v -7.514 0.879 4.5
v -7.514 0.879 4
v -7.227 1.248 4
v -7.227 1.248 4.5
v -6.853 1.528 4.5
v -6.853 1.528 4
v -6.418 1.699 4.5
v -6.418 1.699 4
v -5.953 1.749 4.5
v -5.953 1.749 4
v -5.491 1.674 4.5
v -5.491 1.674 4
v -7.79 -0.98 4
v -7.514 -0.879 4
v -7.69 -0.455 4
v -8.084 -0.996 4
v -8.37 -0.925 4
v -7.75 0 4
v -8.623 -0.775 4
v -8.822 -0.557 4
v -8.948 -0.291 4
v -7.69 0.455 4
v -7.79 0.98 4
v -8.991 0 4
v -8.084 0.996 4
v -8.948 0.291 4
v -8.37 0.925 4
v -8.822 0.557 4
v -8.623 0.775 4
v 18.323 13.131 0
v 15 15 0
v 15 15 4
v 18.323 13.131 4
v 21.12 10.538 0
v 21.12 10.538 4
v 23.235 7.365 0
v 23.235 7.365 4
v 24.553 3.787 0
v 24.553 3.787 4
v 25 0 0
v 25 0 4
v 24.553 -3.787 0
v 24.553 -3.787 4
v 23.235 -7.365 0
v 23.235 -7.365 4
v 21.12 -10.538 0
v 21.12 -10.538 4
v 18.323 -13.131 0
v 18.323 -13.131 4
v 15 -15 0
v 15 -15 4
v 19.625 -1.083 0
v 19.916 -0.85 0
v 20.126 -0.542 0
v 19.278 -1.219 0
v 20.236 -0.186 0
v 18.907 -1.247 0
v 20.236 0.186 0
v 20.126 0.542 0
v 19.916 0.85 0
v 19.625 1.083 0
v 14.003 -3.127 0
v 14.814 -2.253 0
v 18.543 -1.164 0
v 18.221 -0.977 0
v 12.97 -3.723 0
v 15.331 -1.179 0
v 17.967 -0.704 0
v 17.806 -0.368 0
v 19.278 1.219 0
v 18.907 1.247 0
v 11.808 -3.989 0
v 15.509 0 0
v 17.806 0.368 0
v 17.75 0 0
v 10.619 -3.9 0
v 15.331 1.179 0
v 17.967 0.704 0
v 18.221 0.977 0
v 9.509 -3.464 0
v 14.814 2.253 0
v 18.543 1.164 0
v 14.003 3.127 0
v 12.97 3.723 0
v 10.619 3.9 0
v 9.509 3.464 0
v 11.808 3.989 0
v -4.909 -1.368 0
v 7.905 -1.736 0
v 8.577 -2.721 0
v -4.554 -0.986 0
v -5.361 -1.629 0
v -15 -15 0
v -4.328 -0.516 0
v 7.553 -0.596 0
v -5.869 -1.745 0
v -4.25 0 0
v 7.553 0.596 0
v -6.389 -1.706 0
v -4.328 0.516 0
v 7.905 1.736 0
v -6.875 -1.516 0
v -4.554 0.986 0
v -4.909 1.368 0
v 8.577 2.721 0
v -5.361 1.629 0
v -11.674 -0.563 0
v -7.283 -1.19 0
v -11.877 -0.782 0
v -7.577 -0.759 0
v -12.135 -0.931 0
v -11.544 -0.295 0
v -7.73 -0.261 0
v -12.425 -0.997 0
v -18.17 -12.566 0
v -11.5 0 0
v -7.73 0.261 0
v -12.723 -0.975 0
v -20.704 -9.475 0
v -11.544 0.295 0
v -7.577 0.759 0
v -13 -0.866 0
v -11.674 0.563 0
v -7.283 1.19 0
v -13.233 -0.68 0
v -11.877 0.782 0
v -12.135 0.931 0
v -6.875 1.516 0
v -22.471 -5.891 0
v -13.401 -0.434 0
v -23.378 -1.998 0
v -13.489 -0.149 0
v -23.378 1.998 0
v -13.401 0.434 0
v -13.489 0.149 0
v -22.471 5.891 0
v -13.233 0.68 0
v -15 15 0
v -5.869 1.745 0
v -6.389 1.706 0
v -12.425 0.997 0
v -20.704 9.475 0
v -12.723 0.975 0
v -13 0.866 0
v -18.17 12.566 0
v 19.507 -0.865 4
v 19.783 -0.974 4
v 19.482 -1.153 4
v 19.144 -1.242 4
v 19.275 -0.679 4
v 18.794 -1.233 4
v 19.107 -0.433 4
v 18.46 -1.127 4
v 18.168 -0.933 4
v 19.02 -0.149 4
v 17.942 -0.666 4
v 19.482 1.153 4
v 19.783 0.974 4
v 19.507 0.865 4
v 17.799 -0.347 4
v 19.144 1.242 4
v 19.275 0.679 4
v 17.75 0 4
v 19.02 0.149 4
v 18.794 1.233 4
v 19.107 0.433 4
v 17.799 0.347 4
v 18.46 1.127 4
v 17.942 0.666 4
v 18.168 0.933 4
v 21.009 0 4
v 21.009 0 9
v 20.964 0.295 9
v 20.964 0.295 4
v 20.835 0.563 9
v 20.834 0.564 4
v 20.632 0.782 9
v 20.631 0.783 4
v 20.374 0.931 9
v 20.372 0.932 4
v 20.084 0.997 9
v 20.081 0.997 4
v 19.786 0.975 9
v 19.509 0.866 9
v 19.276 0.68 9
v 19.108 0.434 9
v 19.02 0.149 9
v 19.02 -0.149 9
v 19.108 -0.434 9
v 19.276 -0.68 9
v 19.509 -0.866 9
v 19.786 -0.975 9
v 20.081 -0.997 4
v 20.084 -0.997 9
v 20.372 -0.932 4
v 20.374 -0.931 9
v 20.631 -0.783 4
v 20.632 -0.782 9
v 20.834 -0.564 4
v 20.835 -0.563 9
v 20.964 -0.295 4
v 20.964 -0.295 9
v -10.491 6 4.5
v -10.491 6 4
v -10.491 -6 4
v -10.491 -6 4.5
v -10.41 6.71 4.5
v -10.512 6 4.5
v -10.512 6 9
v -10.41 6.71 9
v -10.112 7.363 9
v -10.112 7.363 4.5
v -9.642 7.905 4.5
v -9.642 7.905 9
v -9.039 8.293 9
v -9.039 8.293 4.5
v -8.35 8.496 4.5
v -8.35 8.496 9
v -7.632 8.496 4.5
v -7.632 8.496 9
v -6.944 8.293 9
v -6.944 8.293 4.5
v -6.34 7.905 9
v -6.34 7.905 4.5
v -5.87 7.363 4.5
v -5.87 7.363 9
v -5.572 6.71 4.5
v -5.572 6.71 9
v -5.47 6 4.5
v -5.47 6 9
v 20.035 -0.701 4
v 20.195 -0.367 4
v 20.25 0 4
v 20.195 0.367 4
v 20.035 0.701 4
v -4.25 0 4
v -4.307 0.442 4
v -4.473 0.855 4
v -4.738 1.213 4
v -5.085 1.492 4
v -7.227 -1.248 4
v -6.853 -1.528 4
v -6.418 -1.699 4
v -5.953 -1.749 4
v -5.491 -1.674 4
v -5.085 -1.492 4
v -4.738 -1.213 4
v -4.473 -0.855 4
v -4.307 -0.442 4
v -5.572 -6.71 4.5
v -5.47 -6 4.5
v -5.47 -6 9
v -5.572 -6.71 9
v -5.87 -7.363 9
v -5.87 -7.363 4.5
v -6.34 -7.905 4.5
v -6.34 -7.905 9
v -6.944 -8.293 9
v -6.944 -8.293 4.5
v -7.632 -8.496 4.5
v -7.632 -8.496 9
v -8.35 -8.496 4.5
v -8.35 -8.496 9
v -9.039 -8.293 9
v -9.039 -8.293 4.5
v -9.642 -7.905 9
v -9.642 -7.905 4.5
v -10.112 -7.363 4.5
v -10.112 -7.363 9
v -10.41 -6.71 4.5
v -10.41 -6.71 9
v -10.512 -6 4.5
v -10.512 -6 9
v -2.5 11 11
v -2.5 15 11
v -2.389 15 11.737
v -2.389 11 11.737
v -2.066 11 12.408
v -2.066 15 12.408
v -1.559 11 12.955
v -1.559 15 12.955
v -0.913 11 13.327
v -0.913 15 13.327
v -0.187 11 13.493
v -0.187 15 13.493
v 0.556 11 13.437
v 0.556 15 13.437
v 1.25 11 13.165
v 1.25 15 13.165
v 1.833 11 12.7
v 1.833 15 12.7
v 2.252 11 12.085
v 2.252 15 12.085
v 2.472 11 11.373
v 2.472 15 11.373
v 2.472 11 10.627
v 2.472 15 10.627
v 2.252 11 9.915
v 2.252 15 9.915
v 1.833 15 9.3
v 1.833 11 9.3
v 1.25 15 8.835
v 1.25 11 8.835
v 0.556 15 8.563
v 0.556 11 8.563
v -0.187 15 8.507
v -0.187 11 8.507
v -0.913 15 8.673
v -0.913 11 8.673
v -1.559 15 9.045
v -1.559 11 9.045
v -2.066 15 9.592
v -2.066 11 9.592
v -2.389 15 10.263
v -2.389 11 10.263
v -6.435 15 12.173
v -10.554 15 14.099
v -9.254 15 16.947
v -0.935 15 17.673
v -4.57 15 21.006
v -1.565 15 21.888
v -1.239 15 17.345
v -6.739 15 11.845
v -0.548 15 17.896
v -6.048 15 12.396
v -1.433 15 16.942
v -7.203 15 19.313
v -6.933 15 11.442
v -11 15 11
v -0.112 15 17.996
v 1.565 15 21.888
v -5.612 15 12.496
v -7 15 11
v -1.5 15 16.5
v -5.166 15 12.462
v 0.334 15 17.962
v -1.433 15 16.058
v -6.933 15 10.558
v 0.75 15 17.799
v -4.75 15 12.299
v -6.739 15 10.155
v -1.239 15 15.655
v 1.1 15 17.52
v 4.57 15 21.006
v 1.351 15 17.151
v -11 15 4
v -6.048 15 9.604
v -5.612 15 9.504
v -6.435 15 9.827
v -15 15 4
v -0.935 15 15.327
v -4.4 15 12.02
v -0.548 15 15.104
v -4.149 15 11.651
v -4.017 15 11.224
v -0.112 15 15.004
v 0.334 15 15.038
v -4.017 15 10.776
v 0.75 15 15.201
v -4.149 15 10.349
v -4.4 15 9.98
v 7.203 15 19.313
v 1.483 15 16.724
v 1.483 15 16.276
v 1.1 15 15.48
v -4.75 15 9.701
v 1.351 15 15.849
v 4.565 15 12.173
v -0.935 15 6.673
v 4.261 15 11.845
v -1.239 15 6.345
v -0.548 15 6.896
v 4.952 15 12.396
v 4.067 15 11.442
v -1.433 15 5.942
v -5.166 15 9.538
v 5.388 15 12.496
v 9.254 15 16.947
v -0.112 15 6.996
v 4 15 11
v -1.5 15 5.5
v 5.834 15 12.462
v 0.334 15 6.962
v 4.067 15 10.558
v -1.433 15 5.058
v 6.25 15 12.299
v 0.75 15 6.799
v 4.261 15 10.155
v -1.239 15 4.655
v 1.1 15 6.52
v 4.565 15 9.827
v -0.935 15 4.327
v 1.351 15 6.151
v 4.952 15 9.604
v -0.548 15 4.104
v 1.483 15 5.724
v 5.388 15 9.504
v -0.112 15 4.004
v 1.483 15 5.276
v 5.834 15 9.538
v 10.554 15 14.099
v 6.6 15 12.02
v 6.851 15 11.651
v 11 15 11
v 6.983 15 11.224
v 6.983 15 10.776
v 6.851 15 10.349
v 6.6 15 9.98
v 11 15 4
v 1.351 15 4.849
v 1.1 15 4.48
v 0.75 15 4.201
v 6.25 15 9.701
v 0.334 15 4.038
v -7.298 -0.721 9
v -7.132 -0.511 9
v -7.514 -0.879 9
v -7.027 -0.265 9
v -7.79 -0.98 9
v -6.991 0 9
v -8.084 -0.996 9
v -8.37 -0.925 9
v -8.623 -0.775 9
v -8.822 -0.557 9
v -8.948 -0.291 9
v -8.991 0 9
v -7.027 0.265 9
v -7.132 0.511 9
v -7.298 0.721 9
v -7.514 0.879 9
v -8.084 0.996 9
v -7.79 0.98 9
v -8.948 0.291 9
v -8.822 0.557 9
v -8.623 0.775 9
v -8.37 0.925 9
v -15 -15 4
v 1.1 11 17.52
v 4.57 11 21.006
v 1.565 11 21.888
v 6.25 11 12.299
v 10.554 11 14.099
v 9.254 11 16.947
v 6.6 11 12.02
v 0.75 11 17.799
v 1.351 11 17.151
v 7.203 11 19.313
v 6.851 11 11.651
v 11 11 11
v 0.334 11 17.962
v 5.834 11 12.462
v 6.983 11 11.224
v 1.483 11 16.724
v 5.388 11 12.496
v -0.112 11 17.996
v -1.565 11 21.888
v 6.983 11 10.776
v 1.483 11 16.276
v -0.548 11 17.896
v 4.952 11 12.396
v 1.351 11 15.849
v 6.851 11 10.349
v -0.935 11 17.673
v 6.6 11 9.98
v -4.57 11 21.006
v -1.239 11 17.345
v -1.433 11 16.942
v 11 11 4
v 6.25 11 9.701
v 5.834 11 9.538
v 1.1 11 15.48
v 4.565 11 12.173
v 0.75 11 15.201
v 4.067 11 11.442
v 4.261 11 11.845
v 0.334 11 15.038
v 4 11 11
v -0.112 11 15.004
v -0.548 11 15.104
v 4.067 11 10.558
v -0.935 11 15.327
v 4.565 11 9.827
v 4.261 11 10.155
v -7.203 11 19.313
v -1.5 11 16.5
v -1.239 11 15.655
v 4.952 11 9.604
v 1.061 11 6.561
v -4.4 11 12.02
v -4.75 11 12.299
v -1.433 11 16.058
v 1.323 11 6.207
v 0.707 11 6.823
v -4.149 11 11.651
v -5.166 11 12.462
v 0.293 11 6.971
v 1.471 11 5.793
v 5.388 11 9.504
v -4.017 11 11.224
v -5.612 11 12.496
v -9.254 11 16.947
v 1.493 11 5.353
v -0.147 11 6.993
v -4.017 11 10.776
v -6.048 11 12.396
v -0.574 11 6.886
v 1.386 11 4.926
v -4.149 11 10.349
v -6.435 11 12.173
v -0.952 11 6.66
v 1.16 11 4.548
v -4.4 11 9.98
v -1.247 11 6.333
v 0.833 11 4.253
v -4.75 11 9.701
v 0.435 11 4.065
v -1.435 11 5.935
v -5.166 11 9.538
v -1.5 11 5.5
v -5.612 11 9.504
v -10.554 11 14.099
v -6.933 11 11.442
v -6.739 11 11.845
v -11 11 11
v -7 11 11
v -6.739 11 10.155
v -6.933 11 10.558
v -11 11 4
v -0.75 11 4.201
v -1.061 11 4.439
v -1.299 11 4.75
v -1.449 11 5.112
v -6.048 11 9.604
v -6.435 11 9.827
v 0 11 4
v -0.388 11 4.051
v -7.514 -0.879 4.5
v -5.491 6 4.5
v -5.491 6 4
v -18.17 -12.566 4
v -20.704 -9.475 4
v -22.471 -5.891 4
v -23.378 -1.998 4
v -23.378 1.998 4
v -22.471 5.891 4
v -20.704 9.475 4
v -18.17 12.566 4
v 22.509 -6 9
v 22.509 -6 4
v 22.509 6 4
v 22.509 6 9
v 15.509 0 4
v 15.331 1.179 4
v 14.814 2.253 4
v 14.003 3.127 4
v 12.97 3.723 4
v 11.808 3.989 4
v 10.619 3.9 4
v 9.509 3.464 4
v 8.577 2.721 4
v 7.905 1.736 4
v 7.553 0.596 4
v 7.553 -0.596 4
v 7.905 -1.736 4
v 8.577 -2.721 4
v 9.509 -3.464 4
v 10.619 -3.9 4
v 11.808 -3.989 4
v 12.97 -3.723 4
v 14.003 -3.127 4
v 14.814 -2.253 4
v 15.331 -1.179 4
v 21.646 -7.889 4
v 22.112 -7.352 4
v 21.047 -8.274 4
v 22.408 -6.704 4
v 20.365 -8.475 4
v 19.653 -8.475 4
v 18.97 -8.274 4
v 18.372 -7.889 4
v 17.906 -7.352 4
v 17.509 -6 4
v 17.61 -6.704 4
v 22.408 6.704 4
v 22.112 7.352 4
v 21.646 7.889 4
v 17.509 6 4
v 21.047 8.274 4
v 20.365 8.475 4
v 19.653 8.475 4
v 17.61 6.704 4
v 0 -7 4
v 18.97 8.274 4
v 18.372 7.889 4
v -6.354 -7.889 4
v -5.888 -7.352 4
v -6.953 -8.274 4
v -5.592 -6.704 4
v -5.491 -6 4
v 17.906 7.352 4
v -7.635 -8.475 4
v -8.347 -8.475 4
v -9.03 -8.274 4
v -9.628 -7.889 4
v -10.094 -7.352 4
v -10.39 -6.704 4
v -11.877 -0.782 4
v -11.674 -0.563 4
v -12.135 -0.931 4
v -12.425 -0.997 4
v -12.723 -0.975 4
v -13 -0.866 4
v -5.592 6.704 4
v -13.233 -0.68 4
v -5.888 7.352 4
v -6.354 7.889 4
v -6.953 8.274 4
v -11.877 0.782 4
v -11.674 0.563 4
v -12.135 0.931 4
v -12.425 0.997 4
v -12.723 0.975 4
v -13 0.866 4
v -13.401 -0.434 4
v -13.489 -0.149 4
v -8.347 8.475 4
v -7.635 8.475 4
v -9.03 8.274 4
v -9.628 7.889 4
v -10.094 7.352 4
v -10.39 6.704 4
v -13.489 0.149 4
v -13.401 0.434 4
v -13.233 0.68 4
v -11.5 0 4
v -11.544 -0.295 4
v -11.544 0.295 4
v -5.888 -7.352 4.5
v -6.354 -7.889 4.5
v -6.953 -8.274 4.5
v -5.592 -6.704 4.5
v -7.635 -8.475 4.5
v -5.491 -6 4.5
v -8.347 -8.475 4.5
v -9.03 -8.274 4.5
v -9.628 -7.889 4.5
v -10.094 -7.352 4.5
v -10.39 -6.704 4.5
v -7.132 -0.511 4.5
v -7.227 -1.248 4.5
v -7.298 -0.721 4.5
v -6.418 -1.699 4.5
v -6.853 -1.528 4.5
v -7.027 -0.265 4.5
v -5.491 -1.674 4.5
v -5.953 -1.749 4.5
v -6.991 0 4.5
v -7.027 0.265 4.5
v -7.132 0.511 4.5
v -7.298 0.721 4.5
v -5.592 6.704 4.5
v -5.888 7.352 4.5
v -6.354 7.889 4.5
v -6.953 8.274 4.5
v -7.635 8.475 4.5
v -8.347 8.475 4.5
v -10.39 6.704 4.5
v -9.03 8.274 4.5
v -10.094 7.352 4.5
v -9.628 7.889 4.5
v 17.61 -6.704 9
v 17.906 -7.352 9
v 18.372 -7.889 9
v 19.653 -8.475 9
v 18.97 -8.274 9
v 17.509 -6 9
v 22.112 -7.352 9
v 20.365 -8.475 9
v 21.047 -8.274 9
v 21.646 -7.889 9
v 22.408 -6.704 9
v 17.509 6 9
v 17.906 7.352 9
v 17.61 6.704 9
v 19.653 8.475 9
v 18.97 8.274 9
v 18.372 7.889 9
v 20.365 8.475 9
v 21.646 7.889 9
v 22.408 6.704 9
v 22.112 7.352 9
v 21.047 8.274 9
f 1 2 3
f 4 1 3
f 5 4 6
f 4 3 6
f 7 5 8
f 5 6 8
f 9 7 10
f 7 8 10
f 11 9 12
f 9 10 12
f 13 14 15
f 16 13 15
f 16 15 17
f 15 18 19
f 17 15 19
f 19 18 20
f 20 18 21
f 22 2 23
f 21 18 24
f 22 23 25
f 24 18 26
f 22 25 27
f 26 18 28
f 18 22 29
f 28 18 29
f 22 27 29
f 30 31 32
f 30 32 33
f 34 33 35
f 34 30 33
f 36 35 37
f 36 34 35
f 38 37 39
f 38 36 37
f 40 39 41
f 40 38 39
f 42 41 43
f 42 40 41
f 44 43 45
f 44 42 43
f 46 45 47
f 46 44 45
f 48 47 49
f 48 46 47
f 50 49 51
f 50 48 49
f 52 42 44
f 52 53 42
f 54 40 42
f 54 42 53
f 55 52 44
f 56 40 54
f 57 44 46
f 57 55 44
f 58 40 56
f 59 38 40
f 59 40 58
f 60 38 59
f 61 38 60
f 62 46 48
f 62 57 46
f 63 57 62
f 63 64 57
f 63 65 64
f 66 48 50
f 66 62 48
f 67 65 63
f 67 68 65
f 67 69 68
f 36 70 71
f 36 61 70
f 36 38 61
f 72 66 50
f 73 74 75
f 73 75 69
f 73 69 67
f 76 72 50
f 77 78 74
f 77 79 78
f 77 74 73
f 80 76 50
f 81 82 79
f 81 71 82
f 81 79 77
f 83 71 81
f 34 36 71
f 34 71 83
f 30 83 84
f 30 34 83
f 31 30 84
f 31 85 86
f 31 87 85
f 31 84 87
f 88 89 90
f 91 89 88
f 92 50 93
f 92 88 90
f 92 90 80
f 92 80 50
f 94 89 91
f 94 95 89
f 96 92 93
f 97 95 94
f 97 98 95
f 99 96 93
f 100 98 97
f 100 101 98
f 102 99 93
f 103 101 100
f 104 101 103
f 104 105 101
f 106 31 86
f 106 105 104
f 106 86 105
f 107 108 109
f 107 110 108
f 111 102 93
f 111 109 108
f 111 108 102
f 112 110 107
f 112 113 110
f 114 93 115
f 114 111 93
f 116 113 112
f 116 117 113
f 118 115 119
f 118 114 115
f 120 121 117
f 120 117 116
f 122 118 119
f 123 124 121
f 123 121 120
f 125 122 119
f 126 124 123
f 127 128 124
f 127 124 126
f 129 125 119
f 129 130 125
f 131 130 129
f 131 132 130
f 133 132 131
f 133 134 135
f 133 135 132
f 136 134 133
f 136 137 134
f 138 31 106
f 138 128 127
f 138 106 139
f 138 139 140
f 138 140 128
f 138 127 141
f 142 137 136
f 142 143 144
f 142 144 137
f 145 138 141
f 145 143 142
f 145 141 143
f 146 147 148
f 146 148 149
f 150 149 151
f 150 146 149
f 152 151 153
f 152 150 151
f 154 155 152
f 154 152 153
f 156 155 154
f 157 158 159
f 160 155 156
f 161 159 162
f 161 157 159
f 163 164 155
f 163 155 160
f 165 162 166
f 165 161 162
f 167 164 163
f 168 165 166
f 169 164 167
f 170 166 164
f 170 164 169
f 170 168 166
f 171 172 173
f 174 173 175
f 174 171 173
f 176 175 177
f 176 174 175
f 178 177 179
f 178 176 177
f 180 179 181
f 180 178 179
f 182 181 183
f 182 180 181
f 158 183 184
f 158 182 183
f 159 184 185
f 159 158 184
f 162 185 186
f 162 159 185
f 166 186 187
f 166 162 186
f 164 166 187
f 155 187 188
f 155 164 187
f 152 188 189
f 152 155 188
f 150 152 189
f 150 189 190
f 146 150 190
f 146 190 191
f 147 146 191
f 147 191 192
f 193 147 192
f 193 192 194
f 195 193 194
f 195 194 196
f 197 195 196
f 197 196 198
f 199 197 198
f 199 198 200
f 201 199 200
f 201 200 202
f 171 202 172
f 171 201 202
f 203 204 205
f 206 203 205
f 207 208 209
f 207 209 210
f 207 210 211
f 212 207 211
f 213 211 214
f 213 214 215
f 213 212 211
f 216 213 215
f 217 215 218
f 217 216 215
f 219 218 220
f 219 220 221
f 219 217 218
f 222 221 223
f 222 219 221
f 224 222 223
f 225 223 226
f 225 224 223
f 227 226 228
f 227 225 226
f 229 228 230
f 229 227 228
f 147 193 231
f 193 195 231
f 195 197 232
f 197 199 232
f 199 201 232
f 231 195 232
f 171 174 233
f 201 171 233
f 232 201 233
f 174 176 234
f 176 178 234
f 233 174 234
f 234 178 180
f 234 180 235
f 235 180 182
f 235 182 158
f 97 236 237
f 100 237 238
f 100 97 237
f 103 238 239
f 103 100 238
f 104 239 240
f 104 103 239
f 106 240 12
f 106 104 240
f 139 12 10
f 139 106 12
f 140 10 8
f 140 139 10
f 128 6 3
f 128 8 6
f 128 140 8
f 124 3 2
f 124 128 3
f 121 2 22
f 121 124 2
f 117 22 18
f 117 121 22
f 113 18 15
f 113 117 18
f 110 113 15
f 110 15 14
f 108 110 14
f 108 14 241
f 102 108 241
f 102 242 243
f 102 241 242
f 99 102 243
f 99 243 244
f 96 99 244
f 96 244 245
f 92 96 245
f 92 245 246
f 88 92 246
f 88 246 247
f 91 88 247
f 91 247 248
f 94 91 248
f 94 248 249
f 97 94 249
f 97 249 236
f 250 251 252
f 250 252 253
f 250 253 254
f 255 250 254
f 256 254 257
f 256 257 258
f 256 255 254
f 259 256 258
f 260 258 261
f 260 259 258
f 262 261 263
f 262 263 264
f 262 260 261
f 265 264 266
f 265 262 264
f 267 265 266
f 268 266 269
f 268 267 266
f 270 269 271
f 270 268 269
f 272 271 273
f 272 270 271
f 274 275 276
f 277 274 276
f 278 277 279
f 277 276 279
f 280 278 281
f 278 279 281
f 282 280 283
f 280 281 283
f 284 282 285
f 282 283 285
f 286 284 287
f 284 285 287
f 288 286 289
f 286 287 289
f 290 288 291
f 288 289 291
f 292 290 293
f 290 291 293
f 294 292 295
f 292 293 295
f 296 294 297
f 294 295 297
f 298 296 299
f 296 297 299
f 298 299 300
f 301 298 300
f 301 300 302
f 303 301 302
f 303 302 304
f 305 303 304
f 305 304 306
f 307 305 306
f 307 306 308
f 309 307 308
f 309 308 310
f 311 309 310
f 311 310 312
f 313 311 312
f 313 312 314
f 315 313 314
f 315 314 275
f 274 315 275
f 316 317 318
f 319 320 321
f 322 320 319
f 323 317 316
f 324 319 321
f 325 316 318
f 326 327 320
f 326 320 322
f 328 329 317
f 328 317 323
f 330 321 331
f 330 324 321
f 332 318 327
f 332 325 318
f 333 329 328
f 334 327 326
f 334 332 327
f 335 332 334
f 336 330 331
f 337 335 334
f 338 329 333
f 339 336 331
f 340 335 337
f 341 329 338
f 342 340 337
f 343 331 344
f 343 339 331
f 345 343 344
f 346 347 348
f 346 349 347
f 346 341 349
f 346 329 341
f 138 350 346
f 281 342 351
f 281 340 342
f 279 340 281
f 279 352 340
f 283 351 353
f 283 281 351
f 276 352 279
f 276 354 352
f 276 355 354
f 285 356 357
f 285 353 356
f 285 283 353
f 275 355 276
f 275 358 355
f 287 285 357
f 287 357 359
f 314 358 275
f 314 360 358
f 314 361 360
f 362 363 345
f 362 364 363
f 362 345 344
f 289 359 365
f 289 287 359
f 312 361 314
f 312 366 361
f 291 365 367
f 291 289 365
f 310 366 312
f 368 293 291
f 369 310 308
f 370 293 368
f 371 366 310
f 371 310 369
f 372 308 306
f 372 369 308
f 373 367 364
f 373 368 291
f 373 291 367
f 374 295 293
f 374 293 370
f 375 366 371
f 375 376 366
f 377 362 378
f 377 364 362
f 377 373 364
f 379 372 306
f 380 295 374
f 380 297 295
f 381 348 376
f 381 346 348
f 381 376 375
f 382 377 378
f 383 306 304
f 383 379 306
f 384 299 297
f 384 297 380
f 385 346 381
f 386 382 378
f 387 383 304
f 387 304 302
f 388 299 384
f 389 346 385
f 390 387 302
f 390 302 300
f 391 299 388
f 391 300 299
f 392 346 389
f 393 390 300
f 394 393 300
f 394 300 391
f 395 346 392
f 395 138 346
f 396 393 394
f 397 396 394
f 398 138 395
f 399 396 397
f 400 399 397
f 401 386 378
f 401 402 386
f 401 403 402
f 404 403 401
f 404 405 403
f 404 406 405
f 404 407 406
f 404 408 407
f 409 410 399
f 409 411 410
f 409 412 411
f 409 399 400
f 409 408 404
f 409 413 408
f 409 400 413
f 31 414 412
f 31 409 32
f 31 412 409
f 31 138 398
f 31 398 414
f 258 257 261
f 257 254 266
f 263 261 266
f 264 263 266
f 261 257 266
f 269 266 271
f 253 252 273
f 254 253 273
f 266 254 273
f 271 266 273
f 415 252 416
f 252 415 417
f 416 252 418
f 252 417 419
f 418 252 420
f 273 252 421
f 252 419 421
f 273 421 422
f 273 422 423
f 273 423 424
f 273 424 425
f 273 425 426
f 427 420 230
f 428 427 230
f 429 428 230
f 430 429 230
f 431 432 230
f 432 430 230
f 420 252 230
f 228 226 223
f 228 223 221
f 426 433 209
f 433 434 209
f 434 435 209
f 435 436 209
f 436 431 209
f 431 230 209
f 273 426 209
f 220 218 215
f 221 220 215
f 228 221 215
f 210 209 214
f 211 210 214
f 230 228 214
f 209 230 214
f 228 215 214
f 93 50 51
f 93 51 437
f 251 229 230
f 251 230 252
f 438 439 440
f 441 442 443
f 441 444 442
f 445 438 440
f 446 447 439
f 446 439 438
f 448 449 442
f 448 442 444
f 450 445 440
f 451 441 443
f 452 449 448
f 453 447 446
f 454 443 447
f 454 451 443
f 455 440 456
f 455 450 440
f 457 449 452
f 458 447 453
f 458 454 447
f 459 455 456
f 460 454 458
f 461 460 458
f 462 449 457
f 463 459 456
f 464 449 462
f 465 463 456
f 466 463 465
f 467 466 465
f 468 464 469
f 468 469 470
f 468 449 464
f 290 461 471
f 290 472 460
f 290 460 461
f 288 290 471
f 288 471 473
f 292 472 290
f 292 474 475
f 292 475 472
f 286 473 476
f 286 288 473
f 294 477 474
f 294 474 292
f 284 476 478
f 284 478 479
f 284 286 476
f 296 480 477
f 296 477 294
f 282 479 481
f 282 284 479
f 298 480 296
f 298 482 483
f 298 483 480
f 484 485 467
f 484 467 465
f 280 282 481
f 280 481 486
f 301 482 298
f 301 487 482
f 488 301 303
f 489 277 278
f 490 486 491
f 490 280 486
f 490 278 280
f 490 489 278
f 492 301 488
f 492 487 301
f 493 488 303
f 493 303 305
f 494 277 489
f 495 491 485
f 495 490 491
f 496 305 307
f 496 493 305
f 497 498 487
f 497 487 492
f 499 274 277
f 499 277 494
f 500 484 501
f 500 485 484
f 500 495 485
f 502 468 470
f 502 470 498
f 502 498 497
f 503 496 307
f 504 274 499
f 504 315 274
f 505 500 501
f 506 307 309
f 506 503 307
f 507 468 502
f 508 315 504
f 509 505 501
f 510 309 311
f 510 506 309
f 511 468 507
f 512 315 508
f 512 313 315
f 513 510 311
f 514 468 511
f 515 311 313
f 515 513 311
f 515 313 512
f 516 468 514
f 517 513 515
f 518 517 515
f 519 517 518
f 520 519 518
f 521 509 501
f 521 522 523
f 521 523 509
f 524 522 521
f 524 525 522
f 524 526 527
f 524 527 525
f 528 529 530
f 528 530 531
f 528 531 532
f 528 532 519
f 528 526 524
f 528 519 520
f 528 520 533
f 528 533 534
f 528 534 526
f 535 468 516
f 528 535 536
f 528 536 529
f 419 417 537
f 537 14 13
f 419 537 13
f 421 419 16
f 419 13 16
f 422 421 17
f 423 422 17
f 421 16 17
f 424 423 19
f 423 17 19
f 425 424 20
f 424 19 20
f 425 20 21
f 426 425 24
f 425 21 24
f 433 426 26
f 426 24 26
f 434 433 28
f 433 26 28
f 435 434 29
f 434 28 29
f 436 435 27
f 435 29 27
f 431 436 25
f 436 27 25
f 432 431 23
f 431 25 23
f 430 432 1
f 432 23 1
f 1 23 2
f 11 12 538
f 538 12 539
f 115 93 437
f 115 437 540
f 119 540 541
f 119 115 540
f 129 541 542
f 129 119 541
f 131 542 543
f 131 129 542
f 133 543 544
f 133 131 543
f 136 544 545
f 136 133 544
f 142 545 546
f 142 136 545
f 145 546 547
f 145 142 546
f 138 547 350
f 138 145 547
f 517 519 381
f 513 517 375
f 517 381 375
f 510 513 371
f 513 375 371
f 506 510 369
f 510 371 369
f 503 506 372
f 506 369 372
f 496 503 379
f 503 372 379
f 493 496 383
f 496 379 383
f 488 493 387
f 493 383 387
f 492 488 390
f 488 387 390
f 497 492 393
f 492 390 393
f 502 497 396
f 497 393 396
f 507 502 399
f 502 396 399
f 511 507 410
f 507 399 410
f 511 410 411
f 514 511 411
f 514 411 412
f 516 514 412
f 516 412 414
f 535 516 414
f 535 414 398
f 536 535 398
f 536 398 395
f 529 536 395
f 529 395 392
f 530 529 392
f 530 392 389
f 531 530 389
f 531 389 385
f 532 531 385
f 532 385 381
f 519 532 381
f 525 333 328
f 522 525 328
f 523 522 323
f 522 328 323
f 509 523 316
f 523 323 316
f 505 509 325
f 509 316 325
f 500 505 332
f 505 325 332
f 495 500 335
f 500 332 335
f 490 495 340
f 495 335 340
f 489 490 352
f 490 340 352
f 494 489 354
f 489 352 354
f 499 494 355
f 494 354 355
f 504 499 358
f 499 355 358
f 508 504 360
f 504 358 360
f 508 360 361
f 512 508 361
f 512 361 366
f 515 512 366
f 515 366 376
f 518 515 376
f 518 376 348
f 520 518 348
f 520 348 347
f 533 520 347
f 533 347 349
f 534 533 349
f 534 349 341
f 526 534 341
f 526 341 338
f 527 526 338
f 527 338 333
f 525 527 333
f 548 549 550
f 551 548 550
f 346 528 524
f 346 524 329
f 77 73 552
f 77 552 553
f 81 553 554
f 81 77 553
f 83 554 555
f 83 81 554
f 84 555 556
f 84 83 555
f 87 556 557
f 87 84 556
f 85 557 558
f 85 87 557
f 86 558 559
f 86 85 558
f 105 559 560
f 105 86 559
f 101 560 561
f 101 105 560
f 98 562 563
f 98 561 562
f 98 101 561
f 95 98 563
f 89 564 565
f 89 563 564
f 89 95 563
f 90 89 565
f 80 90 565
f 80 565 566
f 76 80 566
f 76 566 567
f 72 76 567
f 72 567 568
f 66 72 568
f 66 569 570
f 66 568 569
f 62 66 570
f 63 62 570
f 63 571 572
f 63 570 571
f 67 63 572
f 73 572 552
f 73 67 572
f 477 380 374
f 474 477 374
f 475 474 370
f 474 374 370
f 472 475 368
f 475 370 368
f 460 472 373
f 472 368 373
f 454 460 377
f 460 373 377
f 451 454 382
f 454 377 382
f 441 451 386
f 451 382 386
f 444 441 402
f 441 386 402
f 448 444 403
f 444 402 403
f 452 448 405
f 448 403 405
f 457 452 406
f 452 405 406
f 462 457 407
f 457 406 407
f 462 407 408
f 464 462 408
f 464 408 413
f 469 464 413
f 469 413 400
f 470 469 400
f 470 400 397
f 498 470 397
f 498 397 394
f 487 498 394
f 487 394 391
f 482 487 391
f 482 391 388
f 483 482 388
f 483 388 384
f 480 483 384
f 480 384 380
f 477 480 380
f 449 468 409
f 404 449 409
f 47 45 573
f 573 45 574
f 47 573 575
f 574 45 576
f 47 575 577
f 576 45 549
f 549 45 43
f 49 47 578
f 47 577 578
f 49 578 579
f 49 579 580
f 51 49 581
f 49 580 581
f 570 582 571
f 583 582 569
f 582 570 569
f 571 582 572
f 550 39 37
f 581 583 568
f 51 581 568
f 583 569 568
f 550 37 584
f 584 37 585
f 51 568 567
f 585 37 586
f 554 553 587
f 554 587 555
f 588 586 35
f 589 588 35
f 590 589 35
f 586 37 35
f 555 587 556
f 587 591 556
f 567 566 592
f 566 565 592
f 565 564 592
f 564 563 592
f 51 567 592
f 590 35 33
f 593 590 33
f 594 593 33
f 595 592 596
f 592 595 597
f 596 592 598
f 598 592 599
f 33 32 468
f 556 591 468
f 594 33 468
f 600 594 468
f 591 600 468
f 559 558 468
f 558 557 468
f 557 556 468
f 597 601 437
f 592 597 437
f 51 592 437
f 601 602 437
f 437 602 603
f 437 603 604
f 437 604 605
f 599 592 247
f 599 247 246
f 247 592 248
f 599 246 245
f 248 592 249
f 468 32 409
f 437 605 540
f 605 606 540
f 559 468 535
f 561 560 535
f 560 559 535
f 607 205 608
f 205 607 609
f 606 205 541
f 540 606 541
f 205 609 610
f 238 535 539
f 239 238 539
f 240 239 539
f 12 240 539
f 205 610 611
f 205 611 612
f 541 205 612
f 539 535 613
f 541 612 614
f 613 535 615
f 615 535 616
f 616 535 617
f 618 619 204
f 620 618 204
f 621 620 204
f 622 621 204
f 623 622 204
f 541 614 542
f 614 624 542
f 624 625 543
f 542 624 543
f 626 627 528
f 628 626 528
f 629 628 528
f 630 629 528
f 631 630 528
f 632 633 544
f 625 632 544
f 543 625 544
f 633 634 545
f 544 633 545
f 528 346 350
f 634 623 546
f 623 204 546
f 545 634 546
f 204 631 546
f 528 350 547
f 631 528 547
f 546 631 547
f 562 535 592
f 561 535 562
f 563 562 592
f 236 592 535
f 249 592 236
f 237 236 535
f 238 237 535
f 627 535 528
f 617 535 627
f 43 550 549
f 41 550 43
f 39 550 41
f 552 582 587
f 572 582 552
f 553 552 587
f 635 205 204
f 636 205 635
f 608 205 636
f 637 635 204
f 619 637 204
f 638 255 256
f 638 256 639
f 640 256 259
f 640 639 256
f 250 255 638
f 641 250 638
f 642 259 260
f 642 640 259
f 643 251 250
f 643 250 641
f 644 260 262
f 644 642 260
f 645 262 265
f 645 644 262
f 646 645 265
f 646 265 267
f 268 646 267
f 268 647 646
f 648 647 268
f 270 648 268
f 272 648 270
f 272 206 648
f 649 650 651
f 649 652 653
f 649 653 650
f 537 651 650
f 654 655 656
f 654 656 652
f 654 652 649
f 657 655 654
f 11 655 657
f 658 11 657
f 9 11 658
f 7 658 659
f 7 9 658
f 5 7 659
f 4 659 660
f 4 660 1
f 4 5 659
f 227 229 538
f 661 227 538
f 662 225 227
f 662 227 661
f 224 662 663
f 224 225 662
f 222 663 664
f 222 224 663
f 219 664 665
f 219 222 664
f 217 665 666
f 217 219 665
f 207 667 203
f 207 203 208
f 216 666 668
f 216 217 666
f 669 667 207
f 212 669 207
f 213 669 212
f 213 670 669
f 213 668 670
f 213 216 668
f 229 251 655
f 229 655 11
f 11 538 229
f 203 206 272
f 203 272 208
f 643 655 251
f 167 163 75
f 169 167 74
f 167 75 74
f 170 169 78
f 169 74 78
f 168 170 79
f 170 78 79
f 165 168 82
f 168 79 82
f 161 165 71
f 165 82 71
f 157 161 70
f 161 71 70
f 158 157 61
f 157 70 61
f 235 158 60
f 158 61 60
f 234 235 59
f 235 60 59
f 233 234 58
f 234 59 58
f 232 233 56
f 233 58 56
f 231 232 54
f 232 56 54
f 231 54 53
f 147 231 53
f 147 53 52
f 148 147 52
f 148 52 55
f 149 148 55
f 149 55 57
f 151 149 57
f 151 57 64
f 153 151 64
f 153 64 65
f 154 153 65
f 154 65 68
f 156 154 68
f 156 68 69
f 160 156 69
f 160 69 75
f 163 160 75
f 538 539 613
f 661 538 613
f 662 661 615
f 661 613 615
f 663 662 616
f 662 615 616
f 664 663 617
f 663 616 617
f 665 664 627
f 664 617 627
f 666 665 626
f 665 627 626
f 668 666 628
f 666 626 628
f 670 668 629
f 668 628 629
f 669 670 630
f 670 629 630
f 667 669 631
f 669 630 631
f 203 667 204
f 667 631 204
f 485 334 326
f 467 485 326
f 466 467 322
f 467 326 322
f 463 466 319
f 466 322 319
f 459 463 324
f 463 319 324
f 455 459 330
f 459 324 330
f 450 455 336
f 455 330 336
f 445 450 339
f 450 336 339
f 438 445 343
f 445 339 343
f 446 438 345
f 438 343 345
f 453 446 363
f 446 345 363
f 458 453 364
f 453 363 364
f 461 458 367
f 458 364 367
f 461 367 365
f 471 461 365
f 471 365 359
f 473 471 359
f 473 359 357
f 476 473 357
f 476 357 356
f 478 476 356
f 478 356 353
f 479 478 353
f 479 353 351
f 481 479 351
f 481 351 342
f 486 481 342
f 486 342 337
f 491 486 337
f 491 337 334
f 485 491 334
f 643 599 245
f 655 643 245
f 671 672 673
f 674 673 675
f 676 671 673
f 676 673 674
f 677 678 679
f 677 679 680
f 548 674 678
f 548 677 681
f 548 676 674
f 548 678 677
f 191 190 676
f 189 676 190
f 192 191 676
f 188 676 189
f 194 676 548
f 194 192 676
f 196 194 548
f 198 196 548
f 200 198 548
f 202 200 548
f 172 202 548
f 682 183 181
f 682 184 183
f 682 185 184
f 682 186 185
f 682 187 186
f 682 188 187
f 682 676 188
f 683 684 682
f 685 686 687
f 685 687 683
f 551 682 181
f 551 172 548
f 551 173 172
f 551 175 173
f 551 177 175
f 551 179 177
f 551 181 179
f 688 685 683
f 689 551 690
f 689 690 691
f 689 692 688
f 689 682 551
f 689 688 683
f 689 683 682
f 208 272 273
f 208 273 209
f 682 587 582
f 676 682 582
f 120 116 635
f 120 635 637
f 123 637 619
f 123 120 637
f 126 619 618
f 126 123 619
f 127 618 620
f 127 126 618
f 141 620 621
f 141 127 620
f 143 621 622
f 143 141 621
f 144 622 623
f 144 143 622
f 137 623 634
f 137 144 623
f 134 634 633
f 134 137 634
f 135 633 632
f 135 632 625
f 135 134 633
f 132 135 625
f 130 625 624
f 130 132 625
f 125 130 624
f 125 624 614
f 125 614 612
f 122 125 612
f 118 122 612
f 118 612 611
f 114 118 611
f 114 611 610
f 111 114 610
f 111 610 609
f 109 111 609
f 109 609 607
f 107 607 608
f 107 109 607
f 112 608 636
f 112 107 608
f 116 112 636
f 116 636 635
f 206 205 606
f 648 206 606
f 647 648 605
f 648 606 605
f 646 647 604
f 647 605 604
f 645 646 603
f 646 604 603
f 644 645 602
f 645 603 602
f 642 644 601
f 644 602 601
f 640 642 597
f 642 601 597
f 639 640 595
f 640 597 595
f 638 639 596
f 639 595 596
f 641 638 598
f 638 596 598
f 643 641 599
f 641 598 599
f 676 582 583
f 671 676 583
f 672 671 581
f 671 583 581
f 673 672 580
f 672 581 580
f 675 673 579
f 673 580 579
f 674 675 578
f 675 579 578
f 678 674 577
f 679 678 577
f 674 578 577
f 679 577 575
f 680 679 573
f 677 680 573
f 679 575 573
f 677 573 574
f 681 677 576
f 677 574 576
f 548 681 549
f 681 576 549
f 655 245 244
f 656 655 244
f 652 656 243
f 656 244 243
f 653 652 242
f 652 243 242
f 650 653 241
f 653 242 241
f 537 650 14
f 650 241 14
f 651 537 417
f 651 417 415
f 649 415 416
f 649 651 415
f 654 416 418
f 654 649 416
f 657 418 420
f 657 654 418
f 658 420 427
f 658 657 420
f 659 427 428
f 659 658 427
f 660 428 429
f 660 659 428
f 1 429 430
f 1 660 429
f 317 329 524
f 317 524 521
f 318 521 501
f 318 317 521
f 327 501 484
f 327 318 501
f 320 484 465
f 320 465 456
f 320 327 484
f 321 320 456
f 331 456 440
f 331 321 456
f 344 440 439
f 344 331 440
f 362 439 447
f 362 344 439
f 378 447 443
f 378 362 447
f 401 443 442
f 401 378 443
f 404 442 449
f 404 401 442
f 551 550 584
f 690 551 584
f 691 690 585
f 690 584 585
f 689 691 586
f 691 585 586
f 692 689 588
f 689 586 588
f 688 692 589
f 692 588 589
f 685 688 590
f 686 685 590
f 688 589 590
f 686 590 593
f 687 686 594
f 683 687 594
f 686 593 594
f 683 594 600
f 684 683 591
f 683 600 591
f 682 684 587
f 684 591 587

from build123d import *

# Parameters (mm, degrees)
SKETCH1_R               = 1
SKETCH1_R_2             = 1.75
BOSS_EXTRUDE1_DEPTH     = 4
SKETCH2_R               = 1
BOSS_EXTRUDE2_DEPTH     = 5
CUT_EXTRUDE1_DEPTH      = 30.580398915
CUT_EXTRUDE1_DEPTH_BACK = 30.580398915
SKETCH2_3_R             = 4
SKETCH4_W               = 22
SKETCH4_H               = 4
BOSS_EXTRUDE3_DEPTH     = 22
FILLET1_RADIUS          = 11
FILLET1_LENGTH          = 4
SKETCH5_R               = 2.5
SKETCH5_R_2             = 1.5
CUT_EXTRUDE2_DEPTH      = 22
SKETCH8_R               = 1.25
CUT_EXTRUDE4_DEPTH      = 4
BOSS_EXTRUDE4_START     = -4.5
SKETCH11_R              = 1
BOSS_EXTRUDE4_DEPTH     = 4.5


with BuildPart() as part:
    # Sketch1 → Boss-Extrude1 (new body)
    with BuildSketch(Plane.XY):
        with BuildLine():
            Line((-15, 15), (15, 15))
            ThreePointArc((15, 15), (25, 0), (15, -15))
            Line((15, -15), (-15, -15))
            ThreePointArc((-15, -15), (-23.492855685, 0), (-15, 15))
        make_face()
        with Locations((12.5, 0)):
            Circle(SKETCH1_R, mode=Mode.SUBTRACT)
        with Locations((-6, 0)):
            Circle(SKETCH1_R_2, mode=Mode.SUBTRACT)
        with Locations((-12.5, 0)):
            Circle(SKETCH1_R, mode=Mode.SUBTRACT)
    extrude(amount=BOSS_EXTRUDE1_DEPTH)

    # Sketch2 → Boss-Extrude2 (add)
    # profile 1 of 2: a face of its own
    with BuildSketch(Plane.XY.offset(4)):
        with BuildLine():
            Line((22.50880699, -6), (22.50880699, 6))
            ThreePointArc((22.50880699, 6), (20.00880699, 8.5), (17.50880699, 6))
            Line((17.50880699, 6), (17.50880699, -6))
            ThreePointArc((17.50880699, -6), (20.00880699, -8.5), (22.50880699, -6))
        make_face()
        with Locations((20.00880699, 0)):
            Circle(SKETCH2_R, mode=Mode.SUBTRACT)
    # profile 2 of 2: a face of its own
    with BuildSketch(Plane.XY.offset(4)):
        with BuildLine():
            Line((-5.49119301, 1.674400026), (-5.49119301, 6))
            ThreePointArc((-5.49119301, 6), (-7.99119301, 8.5), (-10.49119301, 6))
            Line((-10.49119301, 6), (-10.49119301, -6))
            ThreePointArc((-10.49119301, -6), (-7.99119301, -8.5), (-5.49119301, -6))
            Line((-5.49119301, -6), (-5.49119301, -1.674400026))
            ThreePointArc((-5.49119301, -1.674400026), (-6.640863596, -1.628432944), (-7.5135021, -0.87852797))
            ThreePointArc((-7.5135021, -0.87852797), (-8.99119301, 0), (-7.5135021, 0.87852797))
            ThreePointArc((-7.5135021, 0.87852797), (-6.640863596, 1.628432944), (-5.49119301, 1.674400026))
        make_face()
    extrude(amount=BOSS_EXTRUDE2_DEPTH)

    # Sketch2<3> → Cut-Extrude1 (cut, two sides: drawn at the far end of the back side and taken through both)
    with BuildSketch(Plane.XY.offset(4).offset(-CUT_EXTRUDE1_DEPTH_BACK)):
        with Locations((11.50880699, 0)):
            Circle(SKETCH2_3_R)
    extrude(amount=CUT_EXTRUDE1_DEPTH + CUT_EXTRUDE1_DEPTH_BACK, mode=Mode.SUBTRACT)

    # Sketch4 → Boss-Extrude3 (add)
    with BuildSketch(Plane(origin=(0, 0, 0), x_dir=(-1, 0, 0), z_dir=(0, 0, -1))):
        with Locations((0, 13)):
            Rectangle(SKETCH4_W, SKETCH4_H)
    extrude(amount=-BOSS_EXTRUDE3_DEPTH)

    # Fillet1: full round fillet: the end face becomes a half cylinder, R = half its width
    fillet1_face = Plane((0, 13, 22), x_dir=(0, 1, 0), z_dir=(0, 0, 1))  # on the end face: x along it, z out of the body
    fillet1_slab = fillet1_face.offset(-FILLET1_RADIUS / 2) * Box(FILLET1_LENGTH, 2 * FILLET1_RADIUS, FILLET1_RADIUS, mode=Mode.PRIVATE)  # the body's end, R deep
    fillet1_round = Plane((0, 13, 11), x_dir=(0, 0, 1), z_dir=(0, 1, 0)) * Cylinder(FILLET1_RADIUS, FILLET1_LENGTH, mode=Mode.PRIVATE)  # its axis R under the face
    add(fillet1_slab - fillet1_round, mode=Mode.SUBTRACT)

    # Sketch5 → Cut-Extrude2 (cut)
    with BuildSketch(Plane(origin=(0, 15, 0), x_dir=(1, 0, 0), z_dir=(0, 1, 0))):
        with Locations(Location((0, -11, 0), (0, 0, 180))):
            Circle(SKETCH5_R)
        with Locations(Location((-5.5, -11, 0), (0, 0, 180))):
            Circle(SKETCH5_R_2)
        with Locations(Location((0, -5.5, 0), (0, 0, 180))):
            Circle(SKETCH5_R_2)
        with Locations(Location((5.5, -11, 0), (0, 0, 180))):
            Circle(SKETCH5_R_2)
        with Locations(Location((0, -16.5, 0), (0, 0, 180))):
            Circle(SKETCH5_R_2)
    extrude(amount=-CUT_EXTRUDE2_DEPTH, mode=Mode.SUBTRACT)

    # Sketch8 → Cut-Extrude4 (cut)
    with BuildSketch(Plane(origin=(0, 0, 0), x_dir=(-1, 0, 0), z_dir=(0, 0, -1))):
        with Locations((-19, 0)):
            Circle(SKETCH8_R)
    extrude(amount=-CUT_EXTRUDE4_DEPTH, mode=Mode.SUBTRACT)

    # Sketch11 → Boss-Extrude4 (add)
    with BuildSketch(Plane.XY.offset(9).offset(BOSS_EXTRUDE4_START)):
        with BuildLine():
            Line((-10.512429322, -6), (-10.512429322, 6))
            ThreePointArc((-10.512429322, 6), (-7.99119301, 8.521236312), (-5.469956698, 6))
            Line((-5.469956698, 6), (-5.469956698, -6))
            ThreePointArc((-5.469956698, -6), (-7.99119301, -8.521236312), (-10.512429322, -6))
        make_face()
        with Locations(Location((-7.99119301, 0, 0), (0, 0, 298.53470001))):
            Circle(SKETCH11_R, mode=Mode.SUBTRACT)
    extrude(amount=BOSS_EXTRUDE4_DEPTH)


solid = part.part
